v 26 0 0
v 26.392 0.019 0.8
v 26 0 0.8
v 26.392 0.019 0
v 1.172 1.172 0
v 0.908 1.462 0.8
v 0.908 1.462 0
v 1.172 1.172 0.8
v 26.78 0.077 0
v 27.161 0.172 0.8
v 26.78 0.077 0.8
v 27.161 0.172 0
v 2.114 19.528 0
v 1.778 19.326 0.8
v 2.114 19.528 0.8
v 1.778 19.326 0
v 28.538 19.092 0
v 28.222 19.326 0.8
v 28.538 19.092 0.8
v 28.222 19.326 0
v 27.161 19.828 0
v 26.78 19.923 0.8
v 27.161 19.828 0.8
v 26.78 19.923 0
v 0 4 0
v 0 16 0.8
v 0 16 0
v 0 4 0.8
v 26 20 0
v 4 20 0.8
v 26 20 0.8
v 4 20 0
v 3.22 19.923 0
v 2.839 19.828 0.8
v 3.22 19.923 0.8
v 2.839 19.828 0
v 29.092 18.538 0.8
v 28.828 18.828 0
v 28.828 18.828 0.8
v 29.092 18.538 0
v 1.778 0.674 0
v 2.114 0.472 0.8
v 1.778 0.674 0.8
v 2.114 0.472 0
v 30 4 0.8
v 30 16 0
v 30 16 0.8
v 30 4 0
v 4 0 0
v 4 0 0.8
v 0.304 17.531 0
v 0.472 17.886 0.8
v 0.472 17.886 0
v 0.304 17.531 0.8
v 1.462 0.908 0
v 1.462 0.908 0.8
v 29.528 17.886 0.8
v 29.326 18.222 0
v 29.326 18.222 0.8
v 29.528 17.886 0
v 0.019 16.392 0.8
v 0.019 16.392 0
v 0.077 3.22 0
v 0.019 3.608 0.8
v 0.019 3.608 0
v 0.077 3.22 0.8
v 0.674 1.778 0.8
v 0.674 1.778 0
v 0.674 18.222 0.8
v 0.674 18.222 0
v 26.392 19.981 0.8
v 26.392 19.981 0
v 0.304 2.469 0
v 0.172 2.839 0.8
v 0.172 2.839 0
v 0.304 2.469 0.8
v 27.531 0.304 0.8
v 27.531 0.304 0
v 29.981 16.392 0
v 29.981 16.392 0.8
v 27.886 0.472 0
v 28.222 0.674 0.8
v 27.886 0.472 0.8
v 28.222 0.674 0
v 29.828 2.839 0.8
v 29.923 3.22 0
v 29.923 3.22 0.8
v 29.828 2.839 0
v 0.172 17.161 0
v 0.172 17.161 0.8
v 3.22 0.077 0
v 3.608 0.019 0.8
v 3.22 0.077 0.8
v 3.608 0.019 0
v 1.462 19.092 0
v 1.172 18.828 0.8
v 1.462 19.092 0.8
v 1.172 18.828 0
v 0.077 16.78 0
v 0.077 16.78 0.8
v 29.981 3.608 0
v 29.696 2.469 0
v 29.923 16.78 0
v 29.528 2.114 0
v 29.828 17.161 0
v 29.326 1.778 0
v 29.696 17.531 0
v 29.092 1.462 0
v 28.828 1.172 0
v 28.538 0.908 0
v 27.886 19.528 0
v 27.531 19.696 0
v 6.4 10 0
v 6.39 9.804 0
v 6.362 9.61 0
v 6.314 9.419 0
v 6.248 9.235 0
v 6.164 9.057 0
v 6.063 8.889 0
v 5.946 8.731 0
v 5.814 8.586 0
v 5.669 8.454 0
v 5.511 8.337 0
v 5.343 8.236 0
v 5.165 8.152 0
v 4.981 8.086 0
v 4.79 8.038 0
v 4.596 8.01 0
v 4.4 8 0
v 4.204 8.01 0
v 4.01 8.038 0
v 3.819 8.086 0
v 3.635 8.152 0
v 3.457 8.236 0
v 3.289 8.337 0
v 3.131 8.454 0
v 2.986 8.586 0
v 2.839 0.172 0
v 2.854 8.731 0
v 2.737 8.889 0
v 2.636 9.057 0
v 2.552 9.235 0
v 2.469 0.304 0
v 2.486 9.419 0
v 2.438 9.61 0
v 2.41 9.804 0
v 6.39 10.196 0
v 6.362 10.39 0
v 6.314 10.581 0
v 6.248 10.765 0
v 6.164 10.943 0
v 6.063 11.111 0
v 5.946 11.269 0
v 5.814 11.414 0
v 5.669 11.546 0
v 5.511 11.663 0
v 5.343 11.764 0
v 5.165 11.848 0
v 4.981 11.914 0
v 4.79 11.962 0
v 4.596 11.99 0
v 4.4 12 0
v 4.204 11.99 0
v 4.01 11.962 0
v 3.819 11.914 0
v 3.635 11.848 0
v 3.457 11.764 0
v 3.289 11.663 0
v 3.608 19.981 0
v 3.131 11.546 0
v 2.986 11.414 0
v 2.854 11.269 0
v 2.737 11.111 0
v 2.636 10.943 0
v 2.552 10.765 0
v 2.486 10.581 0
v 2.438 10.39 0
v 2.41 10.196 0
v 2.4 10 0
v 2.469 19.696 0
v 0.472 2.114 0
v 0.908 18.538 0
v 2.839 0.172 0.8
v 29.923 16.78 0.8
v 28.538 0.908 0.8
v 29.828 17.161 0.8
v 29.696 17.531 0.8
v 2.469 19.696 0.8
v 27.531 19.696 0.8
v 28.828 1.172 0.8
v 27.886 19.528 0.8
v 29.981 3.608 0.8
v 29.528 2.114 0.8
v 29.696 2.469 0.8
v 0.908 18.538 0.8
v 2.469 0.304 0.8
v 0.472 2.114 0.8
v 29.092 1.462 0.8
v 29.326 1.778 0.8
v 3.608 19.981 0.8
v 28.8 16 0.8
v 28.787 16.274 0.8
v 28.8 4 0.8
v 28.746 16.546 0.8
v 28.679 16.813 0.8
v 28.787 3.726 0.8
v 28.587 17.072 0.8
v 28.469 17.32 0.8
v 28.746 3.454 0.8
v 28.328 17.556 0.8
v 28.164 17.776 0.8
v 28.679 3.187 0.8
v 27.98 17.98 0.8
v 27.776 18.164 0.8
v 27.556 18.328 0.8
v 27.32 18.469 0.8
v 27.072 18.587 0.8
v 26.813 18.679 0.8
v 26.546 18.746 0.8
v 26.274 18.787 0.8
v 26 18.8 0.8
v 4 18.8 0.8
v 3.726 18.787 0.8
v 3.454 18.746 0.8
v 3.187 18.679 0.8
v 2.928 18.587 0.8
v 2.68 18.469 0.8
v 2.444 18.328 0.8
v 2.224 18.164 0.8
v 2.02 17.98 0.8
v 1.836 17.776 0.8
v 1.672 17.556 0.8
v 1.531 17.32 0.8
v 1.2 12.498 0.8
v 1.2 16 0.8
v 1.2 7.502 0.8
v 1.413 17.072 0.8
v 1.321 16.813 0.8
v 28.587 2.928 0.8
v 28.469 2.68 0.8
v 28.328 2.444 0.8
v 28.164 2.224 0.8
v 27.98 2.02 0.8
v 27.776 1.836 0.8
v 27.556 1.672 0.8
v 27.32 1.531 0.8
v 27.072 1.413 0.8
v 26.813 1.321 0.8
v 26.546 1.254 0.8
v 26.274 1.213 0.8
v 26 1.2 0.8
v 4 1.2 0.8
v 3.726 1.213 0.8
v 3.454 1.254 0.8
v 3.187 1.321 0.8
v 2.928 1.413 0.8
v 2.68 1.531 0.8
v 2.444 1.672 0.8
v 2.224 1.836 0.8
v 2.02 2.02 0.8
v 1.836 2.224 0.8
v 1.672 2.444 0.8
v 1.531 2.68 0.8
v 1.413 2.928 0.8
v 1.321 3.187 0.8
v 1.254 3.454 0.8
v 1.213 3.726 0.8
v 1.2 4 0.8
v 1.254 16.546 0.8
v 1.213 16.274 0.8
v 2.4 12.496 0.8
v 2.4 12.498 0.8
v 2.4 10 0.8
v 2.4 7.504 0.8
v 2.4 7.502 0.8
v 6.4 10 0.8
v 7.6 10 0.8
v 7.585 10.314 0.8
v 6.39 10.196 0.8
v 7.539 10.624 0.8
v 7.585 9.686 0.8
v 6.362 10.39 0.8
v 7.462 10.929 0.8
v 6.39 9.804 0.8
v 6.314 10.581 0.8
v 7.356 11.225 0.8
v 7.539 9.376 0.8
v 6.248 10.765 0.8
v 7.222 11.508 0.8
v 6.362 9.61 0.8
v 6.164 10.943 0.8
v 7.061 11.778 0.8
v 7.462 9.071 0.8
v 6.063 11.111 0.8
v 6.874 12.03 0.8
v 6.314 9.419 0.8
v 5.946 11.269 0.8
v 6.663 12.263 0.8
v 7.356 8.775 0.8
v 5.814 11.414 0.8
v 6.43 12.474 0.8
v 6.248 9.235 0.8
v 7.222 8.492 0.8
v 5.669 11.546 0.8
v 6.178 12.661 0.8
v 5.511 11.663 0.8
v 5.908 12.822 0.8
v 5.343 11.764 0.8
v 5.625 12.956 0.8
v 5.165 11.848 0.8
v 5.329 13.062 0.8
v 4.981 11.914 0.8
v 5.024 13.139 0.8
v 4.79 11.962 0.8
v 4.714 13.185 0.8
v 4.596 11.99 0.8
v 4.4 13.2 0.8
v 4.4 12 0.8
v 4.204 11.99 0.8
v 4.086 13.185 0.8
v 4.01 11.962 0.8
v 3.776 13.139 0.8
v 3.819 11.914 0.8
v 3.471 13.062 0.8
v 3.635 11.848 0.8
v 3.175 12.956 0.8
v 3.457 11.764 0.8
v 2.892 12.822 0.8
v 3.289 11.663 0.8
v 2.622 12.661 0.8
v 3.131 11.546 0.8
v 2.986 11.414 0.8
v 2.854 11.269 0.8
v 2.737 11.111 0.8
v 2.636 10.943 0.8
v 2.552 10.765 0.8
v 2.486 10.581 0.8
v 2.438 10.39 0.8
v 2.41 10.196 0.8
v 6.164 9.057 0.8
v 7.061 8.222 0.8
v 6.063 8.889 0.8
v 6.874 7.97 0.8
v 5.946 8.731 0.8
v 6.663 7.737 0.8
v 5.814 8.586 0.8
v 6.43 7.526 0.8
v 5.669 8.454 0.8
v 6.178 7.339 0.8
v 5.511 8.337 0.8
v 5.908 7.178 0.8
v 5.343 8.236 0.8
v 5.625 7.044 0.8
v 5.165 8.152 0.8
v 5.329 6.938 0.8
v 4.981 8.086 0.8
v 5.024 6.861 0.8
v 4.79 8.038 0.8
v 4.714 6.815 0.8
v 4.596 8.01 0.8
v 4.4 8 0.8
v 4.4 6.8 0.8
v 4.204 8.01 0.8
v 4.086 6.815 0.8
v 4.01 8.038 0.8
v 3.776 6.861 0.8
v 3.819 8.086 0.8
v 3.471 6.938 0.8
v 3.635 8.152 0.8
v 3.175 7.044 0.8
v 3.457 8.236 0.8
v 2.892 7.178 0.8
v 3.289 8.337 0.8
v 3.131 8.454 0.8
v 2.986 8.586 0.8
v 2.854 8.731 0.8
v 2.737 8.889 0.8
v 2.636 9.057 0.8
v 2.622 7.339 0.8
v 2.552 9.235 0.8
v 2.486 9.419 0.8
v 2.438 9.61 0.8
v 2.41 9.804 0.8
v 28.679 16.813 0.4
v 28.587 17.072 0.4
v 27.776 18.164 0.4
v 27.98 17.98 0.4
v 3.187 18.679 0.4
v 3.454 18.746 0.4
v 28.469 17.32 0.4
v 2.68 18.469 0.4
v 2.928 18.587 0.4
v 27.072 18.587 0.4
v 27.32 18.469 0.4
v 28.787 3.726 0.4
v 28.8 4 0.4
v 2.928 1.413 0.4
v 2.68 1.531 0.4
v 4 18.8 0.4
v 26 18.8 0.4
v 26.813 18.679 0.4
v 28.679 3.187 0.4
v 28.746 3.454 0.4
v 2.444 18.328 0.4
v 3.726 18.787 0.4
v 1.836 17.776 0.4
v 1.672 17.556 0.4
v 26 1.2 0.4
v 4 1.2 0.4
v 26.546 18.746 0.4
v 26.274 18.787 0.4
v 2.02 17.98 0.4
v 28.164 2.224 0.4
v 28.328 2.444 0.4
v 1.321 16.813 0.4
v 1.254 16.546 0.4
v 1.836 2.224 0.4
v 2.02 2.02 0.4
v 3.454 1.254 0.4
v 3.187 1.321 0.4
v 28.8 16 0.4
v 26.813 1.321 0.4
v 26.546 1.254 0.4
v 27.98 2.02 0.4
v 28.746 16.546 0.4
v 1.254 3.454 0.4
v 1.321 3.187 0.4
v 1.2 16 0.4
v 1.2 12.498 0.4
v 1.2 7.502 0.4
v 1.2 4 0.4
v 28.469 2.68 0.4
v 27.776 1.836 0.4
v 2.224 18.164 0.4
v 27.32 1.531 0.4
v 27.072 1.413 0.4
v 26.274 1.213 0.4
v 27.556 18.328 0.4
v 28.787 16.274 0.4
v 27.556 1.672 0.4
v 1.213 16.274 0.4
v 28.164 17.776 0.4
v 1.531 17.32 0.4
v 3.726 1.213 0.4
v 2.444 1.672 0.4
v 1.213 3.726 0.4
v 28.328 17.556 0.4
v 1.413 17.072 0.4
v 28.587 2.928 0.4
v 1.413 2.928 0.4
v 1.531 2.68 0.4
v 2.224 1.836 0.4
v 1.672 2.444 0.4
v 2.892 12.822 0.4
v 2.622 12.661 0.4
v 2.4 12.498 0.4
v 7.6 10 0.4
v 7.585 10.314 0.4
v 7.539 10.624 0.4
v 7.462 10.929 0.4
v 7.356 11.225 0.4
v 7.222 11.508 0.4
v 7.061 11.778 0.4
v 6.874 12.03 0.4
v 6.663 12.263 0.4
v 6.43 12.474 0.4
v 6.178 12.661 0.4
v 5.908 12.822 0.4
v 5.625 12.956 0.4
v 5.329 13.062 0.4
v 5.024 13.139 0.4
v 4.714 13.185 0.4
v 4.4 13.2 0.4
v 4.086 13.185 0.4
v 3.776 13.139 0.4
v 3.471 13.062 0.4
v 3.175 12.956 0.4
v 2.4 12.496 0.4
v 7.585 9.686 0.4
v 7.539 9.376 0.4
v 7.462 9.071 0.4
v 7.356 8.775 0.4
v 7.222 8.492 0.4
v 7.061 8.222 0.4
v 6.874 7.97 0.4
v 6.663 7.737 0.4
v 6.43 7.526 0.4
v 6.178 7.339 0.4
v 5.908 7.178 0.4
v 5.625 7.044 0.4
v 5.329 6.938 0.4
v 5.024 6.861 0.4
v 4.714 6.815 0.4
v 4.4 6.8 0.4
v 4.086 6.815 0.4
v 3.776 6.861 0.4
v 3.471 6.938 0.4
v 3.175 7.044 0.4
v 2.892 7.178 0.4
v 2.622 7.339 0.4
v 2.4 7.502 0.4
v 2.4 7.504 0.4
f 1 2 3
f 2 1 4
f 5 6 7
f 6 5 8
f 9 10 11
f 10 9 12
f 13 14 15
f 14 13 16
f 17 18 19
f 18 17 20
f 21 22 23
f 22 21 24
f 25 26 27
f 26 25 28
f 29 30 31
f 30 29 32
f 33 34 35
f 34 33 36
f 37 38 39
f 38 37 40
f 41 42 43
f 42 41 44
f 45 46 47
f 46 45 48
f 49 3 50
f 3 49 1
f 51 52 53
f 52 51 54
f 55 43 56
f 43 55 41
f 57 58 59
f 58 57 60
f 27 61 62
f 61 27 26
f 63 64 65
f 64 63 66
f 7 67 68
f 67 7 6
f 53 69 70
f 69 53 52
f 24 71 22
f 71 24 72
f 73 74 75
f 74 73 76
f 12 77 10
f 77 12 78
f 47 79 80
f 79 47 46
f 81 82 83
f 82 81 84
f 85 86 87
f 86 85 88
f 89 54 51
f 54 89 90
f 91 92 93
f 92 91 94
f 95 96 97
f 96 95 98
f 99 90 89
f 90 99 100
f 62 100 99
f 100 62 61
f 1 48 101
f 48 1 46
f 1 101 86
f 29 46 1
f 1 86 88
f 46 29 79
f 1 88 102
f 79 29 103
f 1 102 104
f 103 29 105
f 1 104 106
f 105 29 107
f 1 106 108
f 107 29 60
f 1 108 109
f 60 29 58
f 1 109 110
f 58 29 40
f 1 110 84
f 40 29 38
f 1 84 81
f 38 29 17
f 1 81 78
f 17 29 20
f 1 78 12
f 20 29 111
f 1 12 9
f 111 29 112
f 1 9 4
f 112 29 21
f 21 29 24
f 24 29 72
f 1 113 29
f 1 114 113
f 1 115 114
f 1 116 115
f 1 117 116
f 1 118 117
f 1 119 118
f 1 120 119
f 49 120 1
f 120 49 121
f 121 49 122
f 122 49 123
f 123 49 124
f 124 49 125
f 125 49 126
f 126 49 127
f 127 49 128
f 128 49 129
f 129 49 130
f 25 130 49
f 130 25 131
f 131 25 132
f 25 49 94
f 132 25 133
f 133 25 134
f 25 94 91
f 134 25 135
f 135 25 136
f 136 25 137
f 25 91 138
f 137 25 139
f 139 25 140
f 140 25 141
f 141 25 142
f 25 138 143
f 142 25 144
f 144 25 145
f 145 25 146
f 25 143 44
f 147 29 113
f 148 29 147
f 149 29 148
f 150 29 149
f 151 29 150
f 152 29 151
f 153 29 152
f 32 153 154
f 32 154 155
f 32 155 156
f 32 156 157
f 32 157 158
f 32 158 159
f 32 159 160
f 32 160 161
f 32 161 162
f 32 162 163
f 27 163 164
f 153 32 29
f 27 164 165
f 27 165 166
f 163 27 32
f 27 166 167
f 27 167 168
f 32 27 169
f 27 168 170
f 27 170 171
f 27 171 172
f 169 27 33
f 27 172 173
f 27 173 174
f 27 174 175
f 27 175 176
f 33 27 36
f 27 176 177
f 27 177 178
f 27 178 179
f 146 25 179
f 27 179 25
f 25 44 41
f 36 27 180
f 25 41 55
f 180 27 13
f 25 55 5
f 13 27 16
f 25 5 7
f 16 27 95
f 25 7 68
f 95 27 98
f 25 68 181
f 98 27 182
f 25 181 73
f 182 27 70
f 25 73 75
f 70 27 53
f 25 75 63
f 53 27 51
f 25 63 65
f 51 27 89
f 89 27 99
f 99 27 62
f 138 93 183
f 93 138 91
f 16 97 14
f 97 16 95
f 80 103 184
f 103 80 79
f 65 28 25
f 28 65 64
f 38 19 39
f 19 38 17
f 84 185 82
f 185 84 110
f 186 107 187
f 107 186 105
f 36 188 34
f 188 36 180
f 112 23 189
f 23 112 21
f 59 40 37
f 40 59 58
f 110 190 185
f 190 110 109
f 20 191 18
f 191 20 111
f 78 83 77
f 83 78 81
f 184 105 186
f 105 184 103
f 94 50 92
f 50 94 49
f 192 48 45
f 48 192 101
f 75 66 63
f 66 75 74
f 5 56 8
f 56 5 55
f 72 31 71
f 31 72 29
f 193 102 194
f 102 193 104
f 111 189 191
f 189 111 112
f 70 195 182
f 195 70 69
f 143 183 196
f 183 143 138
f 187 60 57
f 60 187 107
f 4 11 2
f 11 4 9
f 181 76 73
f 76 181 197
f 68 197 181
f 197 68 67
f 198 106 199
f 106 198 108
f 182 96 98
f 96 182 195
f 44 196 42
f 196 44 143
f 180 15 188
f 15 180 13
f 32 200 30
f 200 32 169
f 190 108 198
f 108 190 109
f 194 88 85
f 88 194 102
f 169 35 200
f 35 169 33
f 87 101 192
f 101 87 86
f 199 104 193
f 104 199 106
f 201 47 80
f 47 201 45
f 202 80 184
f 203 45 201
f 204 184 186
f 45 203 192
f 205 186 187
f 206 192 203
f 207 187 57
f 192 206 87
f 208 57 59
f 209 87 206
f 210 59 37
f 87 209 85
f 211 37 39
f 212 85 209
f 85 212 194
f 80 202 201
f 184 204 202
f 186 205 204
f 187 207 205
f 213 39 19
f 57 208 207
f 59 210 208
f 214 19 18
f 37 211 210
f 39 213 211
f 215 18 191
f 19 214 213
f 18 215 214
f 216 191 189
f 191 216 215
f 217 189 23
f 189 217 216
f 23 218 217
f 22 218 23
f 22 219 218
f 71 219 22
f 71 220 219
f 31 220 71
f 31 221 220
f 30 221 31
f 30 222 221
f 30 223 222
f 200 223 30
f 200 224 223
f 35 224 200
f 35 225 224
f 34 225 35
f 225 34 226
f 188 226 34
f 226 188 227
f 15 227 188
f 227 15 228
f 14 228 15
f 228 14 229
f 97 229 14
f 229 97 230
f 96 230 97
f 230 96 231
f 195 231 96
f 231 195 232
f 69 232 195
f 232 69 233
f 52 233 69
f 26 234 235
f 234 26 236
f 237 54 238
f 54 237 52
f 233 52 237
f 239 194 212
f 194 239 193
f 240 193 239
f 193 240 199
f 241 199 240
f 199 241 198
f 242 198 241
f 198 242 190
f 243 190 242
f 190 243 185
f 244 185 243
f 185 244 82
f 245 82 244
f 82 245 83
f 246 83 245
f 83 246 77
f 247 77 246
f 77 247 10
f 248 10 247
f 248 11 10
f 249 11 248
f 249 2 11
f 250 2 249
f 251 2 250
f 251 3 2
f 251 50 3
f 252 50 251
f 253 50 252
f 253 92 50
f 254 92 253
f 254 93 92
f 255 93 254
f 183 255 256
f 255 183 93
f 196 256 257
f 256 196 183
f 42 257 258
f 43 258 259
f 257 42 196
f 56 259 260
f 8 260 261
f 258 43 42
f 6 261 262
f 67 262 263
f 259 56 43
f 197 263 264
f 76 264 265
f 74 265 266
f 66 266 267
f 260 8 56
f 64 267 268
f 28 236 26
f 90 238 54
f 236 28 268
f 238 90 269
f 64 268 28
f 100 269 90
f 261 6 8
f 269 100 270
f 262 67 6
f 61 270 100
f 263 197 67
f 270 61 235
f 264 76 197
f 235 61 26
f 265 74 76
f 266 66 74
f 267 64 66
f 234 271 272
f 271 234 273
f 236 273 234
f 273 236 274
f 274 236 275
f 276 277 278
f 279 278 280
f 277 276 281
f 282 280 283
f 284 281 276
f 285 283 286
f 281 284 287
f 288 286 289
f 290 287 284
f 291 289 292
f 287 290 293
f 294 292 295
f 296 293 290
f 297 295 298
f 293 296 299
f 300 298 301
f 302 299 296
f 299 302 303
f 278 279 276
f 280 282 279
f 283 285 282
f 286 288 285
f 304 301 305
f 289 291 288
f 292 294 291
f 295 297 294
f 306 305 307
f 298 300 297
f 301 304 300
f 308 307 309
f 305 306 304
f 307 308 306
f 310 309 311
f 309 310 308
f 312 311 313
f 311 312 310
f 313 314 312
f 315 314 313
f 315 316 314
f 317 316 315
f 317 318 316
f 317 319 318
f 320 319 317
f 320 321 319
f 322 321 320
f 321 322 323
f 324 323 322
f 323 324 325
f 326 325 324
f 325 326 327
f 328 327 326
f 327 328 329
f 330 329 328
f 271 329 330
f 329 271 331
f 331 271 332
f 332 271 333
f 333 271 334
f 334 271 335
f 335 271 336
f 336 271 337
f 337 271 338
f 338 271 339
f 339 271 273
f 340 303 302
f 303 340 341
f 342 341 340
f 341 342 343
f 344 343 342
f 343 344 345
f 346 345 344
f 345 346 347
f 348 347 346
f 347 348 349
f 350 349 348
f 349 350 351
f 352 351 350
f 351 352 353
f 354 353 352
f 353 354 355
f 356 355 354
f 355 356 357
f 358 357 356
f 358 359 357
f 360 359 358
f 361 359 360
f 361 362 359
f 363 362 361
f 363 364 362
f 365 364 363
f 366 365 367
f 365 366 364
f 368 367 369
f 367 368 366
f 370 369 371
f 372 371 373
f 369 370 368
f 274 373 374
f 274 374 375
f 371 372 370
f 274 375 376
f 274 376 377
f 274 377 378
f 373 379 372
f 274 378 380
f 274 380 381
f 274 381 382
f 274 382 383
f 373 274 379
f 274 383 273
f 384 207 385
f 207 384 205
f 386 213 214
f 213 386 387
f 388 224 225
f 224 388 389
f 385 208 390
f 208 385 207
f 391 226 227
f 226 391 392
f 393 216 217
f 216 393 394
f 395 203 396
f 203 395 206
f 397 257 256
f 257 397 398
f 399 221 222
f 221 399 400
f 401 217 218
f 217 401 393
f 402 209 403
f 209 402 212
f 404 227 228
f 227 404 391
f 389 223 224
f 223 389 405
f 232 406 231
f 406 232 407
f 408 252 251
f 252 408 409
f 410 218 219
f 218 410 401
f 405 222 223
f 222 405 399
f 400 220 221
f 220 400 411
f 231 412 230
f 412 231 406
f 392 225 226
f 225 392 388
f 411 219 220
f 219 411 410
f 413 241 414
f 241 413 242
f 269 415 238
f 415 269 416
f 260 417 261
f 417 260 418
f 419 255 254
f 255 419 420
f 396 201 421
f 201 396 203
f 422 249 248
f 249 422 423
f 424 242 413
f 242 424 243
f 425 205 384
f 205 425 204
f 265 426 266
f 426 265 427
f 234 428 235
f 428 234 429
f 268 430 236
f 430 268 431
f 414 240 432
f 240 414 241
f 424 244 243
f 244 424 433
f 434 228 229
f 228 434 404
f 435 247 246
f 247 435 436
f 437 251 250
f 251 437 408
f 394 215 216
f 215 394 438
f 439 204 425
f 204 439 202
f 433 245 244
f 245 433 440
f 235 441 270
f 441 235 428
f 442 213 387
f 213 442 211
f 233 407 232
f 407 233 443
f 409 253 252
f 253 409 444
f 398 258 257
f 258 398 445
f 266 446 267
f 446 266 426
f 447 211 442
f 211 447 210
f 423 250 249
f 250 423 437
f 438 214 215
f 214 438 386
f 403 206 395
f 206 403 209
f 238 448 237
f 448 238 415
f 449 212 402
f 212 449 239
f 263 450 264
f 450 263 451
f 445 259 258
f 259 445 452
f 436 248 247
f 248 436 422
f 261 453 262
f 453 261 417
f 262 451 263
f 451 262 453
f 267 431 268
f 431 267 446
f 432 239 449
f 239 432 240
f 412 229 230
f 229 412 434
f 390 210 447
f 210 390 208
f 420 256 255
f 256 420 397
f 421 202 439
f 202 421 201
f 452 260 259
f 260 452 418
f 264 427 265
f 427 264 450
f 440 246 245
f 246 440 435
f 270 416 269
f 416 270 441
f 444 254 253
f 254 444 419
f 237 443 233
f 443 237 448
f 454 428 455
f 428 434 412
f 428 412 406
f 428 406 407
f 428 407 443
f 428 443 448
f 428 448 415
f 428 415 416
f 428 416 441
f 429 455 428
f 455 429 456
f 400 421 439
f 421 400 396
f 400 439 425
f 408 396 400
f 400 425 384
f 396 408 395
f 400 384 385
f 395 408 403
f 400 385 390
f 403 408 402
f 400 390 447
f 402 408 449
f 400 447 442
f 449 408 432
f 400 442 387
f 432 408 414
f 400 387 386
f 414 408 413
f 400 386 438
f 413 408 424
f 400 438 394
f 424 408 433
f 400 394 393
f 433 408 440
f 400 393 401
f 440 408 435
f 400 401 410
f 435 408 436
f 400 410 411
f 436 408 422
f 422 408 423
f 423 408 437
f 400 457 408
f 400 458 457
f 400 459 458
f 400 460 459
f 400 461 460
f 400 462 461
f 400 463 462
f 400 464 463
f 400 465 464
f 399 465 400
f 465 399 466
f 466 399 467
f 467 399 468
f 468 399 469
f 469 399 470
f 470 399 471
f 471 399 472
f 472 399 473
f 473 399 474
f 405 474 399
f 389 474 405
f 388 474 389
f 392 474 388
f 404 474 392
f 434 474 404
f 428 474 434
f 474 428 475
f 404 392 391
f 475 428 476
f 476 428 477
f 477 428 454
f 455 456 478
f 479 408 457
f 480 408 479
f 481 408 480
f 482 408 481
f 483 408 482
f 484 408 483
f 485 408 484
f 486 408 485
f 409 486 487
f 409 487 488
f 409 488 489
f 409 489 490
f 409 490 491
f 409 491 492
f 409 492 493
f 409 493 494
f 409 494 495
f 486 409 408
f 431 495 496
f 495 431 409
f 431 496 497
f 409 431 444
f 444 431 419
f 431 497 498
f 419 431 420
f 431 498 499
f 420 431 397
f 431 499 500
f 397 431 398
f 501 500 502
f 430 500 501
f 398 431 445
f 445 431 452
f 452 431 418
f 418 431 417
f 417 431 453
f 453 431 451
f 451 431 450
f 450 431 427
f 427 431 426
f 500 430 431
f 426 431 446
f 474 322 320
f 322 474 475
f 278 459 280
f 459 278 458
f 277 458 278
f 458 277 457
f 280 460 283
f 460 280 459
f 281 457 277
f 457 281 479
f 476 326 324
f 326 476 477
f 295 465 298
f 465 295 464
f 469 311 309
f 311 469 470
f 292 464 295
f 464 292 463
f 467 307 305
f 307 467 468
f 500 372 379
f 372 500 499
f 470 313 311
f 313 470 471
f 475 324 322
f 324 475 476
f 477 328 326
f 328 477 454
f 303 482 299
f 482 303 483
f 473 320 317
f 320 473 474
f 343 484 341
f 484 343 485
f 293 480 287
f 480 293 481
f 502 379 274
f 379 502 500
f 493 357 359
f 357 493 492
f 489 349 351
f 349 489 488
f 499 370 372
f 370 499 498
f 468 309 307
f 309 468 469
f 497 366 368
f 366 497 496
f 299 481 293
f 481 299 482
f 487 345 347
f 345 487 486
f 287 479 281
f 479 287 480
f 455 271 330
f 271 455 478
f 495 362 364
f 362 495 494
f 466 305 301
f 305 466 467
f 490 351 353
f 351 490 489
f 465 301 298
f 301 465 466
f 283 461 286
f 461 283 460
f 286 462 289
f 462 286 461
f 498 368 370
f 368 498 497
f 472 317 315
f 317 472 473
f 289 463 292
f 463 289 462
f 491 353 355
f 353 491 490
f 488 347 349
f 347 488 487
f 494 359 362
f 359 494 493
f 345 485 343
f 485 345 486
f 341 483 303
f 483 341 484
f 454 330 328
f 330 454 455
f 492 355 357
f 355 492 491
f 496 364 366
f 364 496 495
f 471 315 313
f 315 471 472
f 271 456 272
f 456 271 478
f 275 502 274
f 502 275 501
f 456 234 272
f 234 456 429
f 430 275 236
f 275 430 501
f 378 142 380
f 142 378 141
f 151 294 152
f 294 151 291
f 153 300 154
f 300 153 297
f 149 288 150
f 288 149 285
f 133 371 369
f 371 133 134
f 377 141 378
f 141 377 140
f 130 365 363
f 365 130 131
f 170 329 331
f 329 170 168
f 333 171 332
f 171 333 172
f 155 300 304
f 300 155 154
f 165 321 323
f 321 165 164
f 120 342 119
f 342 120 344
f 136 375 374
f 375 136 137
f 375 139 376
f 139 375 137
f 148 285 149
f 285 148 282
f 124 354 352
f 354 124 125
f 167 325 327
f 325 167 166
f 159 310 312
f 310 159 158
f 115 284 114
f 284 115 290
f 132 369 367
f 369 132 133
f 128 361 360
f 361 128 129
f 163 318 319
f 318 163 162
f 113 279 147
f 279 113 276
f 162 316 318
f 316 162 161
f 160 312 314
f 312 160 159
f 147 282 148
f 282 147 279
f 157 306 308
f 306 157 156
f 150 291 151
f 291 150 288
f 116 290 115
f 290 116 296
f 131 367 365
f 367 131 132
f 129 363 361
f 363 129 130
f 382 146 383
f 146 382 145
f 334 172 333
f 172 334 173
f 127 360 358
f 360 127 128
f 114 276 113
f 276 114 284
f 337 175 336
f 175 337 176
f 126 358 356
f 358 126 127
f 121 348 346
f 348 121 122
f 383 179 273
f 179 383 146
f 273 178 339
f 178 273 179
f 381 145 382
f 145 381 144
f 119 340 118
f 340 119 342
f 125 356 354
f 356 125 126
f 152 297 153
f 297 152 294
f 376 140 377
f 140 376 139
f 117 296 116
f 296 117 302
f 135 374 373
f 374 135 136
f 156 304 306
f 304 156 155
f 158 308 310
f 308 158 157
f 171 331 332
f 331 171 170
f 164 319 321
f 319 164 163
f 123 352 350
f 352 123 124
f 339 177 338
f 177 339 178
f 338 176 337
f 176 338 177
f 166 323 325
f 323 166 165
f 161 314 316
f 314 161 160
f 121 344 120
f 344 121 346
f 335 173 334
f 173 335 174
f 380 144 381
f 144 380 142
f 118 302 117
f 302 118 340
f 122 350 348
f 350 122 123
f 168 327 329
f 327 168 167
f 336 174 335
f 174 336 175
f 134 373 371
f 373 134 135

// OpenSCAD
// Length of the tag
length=30; // [30:1:100]

// Width of tag
width=20; // [15:1:50]

// Radius of the corners
corner_radius=4; // [0:0.5:20]

// Diameter of hole
hole_diameter=4; // [2:1:10]

// Thickness of the main part of tag
thickness=0.4; //[0.2:0.05:2.0]

// Thickness of edge reinforcements
reinforced_thickness=0.8; // [0.4:0.05:2.5]

// Width of reinforced edge
reinforced_width=1.2; // [0.5:0.1:3]


difference(){
  $fn=64;
  chord_width=2*sqrt(hole_diameter*reinforced_width+reinforced_width^2);
  union(){
    RoundRect([length,width,thickness],corner_radius);
    RoundRectTube([length,width,reinforced_thickness],corner_radius,reinforced_width);
    translate([hole_diameter/2+reinforced_width*2,width/2,0])
      cylinder(d=hole_diameter+reinforced_width*2,h=reinforced_thickness);
    translate([reinforced_width, (width-chord_width)/2, 0])
      cube([reinforced_width, chord_width, reinforced_thickness]);
  }
  translate([hole_diameter/2+reinforced_width*2,width/2,-1])
    cylinder(d=hole_diameter,h=reinforced_thickness+2);
}

module RoundRect(size, radius){
  s=size;
  r=min(radius,s.x/2,s.y/2);

  hull() for(x=[r,s.x-r]) for(y=[r,s.y-r]){
    translate([x,y,0]) cylinder(r=r,h=s.z);
  }
}

module RoundRectTube(size,radius,wall_thickness){
  inner_size = [
    size.x-wall_thickness*2,
    size.y-wall_thickness*2,
    size.z+2
  ];
  difference(){
    RoundRect(size=size, radius=radius);
    translate([wall_thickness,wall_thickness,-1]){
      RoundRect(inner_size, radius=radius-wall_thickness);
    }
  }
}
